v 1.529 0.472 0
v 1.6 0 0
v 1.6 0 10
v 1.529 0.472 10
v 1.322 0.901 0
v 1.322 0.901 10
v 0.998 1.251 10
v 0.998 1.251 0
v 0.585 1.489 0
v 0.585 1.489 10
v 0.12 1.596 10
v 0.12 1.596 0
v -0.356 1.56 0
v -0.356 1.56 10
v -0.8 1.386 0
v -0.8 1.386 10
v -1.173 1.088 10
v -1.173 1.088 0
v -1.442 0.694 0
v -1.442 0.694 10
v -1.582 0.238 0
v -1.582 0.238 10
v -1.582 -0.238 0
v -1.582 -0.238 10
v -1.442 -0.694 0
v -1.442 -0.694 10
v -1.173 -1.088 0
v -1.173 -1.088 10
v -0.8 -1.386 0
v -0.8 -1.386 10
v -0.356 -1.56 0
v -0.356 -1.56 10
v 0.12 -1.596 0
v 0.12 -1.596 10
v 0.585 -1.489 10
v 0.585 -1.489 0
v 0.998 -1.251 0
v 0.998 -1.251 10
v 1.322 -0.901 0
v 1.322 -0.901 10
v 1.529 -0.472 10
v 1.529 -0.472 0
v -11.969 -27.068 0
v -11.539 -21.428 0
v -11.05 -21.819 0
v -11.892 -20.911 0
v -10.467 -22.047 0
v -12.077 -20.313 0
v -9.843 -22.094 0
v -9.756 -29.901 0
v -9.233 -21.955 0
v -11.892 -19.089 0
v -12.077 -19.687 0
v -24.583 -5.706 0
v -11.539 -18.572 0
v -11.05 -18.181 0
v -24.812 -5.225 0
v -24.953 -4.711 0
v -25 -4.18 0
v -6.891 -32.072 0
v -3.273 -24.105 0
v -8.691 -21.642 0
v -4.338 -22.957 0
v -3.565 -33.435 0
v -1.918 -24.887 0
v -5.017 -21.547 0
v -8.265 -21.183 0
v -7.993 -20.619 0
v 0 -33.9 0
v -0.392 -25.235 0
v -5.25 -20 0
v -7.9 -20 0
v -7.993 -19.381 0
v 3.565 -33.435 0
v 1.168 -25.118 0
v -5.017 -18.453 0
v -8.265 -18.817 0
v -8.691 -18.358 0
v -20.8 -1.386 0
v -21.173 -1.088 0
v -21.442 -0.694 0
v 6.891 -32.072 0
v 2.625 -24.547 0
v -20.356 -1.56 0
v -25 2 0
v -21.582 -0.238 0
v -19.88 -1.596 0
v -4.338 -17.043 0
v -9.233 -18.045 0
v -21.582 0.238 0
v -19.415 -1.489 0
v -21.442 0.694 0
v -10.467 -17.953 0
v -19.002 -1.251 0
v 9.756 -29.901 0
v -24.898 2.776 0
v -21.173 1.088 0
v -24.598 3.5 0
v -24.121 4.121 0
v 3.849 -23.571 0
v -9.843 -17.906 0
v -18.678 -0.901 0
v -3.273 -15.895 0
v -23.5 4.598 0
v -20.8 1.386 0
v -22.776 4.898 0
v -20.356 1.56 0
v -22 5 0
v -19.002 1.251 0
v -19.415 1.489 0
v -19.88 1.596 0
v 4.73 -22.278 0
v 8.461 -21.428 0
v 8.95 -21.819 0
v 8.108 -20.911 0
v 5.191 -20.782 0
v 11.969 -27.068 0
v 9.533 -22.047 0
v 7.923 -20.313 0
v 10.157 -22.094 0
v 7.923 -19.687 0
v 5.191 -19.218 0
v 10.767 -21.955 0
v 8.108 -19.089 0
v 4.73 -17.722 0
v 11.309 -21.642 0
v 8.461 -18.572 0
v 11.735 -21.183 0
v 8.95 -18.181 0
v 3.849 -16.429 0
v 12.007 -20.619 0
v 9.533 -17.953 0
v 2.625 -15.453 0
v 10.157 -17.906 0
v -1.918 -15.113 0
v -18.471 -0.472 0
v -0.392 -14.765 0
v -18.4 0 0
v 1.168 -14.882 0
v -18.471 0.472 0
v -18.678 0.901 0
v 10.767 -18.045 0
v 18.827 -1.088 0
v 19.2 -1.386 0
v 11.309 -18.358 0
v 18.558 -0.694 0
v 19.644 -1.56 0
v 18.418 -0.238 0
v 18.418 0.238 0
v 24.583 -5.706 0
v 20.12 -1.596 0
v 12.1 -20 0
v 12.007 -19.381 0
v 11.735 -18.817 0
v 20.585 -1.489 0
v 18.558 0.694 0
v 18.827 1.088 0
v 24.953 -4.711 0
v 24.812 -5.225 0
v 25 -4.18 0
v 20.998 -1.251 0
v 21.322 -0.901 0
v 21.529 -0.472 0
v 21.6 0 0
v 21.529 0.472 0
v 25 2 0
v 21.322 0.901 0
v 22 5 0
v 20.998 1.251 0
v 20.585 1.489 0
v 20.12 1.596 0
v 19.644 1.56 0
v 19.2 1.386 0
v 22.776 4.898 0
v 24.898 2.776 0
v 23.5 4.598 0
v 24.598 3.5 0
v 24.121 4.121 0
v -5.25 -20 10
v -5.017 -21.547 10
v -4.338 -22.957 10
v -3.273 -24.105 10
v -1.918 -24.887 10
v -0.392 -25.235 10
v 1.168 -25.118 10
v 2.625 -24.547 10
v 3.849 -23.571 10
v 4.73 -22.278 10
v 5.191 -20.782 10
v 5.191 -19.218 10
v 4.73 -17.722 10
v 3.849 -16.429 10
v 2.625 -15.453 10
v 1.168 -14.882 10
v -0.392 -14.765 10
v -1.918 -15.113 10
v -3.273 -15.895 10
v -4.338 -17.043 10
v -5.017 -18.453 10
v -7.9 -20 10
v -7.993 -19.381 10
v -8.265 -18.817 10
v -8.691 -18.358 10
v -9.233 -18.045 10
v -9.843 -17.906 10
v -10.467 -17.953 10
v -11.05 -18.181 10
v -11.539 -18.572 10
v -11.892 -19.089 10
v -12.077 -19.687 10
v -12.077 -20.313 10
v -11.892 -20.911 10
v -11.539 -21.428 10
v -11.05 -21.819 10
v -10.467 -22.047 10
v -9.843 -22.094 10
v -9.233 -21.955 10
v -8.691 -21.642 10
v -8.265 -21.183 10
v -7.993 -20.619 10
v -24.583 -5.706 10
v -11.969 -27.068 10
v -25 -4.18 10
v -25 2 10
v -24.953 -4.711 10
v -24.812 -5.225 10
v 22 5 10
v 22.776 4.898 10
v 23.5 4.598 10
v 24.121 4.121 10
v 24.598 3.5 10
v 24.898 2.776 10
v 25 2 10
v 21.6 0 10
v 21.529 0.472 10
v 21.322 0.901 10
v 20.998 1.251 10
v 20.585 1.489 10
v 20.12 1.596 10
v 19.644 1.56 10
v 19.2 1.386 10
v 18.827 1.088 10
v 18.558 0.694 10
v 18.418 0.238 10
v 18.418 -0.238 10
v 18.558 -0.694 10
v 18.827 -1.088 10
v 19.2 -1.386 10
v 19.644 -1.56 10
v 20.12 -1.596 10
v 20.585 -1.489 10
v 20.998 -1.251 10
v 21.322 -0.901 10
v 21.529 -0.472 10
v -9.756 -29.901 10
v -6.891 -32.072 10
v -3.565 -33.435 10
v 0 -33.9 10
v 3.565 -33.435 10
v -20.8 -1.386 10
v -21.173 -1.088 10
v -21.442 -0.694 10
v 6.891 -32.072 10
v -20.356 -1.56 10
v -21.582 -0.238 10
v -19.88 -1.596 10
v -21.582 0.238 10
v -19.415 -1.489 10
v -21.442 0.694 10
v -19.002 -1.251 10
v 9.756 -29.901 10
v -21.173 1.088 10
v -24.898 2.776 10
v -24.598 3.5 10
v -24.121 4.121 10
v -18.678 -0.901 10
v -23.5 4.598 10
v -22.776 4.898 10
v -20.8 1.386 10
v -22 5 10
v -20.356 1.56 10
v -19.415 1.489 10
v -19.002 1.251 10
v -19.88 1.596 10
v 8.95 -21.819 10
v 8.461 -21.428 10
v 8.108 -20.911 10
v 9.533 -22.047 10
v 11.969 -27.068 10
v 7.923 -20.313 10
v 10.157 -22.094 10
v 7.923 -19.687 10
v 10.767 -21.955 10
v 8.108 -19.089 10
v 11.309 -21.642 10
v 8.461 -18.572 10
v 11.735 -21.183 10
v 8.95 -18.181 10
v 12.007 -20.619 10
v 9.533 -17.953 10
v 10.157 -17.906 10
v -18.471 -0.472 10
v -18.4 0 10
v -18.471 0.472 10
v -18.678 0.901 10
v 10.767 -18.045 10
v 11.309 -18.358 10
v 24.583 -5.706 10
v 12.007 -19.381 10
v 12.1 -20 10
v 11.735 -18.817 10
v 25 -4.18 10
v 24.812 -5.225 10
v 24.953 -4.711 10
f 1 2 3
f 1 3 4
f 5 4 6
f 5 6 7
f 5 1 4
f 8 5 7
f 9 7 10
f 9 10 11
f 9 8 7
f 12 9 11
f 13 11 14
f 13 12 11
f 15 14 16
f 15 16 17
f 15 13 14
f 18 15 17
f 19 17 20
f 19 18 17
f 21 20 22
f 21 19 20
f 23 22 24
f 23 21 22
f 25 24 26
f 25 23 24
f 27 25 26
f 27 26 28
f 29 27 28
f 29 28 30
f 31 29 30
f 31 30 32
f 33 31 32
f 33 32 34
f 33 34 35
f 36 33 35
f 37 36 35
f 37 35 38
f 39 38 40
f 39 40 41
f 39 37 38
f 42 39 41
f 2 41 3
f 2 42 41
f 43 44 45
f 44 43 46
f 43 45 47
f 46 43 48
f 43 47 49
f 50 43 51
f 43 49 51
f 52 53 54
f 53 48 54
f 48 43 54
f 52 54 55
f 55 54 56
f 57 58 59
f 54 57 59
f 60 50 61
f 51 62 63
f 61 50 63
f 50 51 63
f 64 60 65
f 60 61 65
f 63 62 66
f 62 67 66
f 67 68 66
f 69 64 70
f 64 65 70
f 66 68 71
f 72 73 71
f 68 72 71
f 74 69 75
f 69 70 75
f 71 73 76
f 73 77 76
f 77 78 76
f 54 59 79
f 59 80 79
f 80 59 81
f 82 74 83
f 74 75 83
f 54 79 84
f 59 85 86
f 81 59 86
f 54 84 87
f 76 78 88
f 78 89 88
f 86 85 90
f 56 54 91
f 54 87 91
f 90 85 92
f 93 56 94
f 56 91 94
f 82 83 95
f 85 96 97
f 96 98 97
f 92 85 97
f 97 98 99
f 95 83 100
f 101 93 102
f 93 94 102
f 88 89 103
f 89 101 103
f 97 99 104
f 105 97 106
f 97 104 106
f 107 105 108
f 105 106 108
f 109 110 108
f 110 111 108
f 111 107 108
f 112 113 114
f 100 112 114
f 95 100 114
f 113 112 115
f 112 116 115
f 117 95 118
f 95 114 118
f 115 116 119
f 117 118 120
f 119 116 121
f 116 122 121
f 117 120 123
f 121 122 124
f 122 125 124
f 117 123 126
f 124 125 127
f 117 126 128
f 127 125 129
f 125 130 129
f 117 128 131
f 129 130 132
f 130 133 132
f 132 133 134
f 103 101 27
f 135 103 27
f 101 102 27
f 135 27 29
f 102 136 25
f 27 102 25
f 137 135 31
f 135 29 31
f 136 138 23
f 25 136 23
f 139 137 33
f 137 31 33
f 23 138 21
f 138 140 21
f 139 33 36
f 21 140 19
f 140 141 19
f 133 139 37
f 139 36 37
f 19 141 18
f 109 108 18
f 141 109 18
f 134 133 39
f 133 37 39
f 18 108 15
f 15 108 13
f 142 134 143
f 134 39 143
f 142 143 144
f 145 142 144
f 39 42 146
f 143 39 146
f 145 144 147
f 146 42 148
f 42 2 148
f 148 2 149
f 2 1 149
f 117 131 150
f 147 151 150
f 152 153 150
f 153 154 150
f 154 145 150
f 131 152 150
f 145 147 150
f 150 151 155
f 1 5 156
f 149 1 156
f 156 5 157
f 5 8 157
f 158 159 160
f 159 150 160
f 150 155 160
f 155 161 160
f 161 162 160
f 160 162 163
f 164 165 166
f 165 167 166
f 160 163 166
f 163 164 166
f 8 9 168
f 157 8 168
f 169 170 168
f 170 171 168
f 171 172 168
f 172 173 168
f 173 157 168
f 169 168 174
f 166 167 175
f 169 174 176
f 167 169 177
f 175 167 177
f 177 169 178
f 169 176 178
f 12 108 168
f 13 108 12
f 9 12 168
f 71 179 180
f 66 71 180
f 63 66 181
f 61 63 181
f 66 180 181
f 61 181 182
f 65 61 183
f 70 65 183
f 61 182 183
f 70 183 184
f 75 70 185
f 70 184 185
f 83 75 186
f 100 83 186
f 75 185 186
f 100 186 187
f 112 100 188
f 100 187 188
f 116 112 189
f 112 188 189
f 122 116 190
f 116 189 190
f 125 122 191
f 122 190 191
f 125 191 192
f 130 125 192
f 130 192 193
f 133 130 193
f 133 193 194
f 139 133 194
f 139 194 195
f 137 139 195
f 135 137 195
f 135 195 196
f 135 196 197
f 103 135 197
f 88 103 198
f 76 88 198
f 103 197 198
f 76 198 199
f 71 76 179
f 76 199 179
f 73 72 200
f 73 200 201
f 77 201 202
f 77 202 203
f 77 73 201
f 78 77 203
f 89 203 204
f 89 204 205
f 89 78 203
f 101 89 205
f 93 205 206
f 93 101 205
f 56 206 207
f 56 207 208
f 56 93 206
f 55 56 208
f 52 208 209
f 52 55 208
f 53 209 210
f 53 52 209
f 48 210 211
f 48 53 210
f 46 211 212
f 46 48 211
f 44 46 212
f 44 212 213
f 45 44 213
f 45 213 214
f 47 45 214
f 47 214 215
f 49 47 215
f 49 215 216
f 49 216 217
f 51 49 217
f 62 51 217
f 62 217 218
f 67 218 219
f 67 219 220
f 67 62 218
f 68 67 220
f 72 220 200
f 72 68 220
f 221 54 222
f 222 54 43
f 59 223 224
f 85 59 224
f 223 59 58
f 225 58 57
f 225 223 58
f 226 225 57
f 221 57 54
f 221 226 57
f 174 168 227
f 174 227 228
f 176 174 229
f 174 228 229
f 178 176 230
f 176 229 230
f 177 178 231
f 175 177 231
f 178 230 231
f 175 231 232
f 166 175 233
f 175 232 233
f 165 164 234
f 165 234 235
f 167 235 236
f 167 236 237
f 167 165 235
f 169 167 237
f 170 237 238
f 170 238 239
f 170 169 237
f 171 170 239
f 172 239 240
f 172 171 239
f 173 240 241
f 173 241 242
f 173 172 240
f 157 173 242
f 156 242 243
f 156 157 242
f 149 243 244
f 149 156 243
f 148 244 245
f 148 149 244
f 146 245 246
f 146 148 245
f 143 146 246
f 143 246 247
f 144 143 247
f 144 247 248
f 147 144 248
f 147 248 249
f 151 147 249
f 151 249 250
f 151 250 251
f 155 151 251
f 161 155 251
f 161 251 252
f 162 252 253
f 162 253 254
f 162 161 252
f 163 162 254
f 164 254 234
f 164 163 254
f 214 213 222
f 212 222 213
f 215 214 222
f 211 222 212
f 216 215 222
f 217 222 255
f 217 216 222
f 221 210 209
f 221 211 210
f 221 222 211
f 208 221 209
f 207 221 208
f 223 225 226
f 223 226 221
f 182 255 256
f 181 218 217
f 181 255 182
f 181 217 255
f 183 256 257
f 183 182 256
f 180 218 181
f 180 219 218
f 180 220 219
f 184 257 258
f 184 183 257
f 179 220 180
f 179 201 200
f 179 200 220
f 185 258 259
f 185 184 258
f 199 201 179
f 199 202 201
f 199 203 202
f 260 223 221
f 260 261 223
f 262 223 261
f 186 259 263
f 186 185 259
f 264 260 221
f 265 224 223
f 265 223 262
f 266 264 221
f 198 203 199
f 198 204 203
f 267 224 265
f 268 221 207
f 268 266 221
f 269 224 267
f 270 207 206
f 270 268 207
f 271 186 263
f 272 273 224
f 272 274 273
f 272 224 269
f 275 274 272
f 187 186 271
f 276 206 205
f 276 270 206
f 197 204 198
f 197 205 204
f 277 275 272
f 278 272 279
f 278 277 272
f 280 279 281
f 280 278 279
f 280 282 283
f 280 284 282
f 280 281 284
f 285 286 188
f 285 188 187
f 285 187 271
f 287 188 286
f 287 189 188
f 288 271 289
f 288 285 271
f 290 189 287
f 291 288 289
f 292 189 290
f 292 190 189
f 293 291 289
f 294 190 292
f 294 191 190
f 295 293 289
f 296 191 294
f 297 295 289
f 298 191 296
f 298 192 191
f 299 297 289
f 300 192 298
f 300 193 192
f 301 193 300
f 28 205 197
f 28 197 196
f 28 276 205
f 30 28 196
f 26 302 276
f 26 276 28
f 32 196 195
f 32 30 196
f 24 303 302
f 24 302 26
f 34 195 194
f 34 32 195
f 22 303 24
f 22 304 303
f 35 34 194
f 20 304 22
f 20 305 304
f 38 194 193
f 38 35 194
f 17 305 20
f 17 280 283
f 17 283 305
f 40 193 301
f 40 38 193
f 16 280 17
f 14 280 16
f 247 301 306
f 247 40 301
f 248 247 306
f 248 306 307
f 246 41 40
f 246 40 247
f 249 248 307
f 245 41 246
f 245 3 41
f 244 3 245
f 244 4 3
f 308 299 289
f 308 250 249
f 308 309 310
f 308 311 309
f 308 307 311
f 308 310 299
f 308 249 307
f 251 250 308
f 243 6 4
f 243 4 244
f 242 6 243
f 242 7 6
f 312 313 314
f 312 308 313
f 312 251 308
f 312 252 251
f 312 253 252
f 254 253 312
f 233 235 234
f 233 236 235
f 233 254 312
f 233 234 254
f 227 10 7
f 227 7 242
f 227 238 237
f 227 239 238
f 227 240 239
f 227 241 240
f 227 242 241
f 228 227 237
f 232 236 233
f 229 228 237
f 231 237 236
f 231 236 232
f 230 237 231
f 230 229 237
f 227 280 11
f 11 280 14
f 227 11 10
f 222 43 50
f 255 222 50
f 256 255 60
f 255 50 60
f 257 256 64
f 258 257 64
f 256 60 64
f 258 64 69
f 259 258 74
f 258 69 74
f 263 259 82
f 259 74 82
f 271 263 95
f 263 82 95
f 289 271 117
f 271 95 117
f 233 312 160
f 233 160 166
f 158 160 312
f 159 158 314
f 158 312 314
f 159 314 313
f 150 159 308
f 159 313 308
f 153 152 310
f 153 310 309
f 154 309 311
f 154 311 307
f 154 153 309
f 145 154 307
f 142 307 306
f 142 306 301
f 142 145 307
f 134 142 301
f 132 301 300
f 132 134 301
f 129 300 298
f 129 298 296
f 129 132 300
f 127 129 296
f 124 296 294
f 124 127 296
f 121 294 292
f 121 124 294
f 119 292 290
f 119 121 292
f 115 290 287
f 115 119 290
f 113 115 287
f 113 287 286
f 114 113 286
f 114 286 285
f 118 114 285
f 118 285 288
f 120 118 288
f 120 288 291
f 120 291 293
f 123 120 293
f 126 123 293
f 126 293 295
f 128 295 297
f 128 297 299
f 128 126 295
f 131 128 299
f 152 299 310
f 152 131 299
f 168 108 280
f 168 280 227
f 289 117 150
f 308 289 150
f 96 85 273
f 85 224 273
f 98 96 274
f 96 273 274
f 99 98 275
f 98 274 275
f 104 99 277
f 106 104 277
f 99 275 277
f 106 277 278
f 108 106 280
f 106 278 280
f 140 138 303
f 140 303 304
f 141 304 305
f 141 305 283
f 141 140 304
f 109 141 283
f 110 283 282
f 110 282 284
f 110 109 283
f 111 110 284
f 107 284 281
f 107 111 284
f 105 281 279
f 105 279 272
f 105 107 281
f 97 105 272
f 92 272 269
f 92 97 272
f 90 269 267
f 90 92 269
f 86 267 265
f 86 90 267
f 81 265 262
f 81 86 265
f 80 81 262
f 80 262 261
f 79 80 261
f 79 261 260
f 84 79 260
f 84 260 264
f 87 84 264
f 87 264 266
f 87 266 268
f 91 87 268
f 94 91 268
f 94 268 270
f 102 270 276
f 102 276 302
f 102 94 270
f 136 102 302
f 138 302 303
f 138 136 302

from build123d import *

# Parameters (mm, degrees)
SKETCH_1_R          = 13.9
SKETCH_1_R_2        = 2.1
SKETCH_1_W          = 50
SKETCH_1_H          = 10
SKETCH_1_R_3        = 1.6
EXTRUDE_1_DEPTH     = 10
FILLET_1_R          = 3
CUT_EXTRUDE_1_DEPTH = 10


with BuildPart() as part:
    # ｽｹｯﾁ1 → ﾎﾞｽ - 押し出し1 (new body)
    # profile 1 of 3: a face of its own
    with BuildSketch(Plane.XY):
        with Locations((0, -20)):
            Circle(SKETCH_1_R)
        with Locations((-10, -20)):
            Circle(SKETCH_1_R_2, mode=Mode.SUBTRACT)
        with Locations((10, -20)):
            Circle(SKETCH_1_R_2, mode=Mode.SUBTRACT)
    # profile 2 of 3: a face of its own
    with BuildSketch(Plane.XY):
        with BuildLine():
            Line((25, -5), (-25, -5))
            Line((-25, -5), (-11.969023725, -27.067706209))
            ThreePointArc((-11.969023725, -27.067706209), (-3.66337073, -6.591431288), (13.9, -20))
            ThreePointArc((13.9, -20), (13.408568712, -23.66337073), (11.969023725, -27.067706209))
            Line((11.969023725, -27.067706209), (25, -5))
        make_face()
    # profile 3 of 3: a face of its own
    with BuildSketch(Plane.XY):
        Rectangle(SKETCH_1_W, SKETCH_1_H)
        Circle(SKETCH_1_R_3, mode=Mode.SUBTRACT)
        with Locations((-20, 0)):
            Circle(SKETCH_1_R_3, mode=Mode.SUBTRACT)
        with Locations((20, 0)):
            Circle(SKETCH_1_R_3, mode=Mode.SUBTRACT)
    extrude(amount=EXTRUDE_1_DEPTH)

    # ﾌｨﾚｯﾄ1
    fillet_1_edges = [part.edges().sort_by_distance(p)[0] for p in [
        (-25, -5, 5),
        (-25, 5, 5),
        (25, 5, 5),
        (25, -5, 5),
    ]]
    fillet(fillet_1_edges, radius=FILLET_1_R)

    # ｽｹｯﾁ2 → ｶｯﾄ - 押し出し1 (cut)
    with BuildSketch(Plane.XY.offset(10)):
        with BuildLine():
            ThreePointArc((5.25, -20), (0, -14.75), (-5.25, -20))
            Line((-5.25, -20), (5.25, -20))
        make_face()
        with BuildLine():
            Line((5.25, -20), (-5.25, -20))
            ThreePointArc((-5.25, -20), (0, -25.25), (5.25, -20))
        make_face()
    extrude(amount=-CUT_EXTRUDE_1_DEPTH, mode=Mode.SUBTRACT)


solid = part.part
